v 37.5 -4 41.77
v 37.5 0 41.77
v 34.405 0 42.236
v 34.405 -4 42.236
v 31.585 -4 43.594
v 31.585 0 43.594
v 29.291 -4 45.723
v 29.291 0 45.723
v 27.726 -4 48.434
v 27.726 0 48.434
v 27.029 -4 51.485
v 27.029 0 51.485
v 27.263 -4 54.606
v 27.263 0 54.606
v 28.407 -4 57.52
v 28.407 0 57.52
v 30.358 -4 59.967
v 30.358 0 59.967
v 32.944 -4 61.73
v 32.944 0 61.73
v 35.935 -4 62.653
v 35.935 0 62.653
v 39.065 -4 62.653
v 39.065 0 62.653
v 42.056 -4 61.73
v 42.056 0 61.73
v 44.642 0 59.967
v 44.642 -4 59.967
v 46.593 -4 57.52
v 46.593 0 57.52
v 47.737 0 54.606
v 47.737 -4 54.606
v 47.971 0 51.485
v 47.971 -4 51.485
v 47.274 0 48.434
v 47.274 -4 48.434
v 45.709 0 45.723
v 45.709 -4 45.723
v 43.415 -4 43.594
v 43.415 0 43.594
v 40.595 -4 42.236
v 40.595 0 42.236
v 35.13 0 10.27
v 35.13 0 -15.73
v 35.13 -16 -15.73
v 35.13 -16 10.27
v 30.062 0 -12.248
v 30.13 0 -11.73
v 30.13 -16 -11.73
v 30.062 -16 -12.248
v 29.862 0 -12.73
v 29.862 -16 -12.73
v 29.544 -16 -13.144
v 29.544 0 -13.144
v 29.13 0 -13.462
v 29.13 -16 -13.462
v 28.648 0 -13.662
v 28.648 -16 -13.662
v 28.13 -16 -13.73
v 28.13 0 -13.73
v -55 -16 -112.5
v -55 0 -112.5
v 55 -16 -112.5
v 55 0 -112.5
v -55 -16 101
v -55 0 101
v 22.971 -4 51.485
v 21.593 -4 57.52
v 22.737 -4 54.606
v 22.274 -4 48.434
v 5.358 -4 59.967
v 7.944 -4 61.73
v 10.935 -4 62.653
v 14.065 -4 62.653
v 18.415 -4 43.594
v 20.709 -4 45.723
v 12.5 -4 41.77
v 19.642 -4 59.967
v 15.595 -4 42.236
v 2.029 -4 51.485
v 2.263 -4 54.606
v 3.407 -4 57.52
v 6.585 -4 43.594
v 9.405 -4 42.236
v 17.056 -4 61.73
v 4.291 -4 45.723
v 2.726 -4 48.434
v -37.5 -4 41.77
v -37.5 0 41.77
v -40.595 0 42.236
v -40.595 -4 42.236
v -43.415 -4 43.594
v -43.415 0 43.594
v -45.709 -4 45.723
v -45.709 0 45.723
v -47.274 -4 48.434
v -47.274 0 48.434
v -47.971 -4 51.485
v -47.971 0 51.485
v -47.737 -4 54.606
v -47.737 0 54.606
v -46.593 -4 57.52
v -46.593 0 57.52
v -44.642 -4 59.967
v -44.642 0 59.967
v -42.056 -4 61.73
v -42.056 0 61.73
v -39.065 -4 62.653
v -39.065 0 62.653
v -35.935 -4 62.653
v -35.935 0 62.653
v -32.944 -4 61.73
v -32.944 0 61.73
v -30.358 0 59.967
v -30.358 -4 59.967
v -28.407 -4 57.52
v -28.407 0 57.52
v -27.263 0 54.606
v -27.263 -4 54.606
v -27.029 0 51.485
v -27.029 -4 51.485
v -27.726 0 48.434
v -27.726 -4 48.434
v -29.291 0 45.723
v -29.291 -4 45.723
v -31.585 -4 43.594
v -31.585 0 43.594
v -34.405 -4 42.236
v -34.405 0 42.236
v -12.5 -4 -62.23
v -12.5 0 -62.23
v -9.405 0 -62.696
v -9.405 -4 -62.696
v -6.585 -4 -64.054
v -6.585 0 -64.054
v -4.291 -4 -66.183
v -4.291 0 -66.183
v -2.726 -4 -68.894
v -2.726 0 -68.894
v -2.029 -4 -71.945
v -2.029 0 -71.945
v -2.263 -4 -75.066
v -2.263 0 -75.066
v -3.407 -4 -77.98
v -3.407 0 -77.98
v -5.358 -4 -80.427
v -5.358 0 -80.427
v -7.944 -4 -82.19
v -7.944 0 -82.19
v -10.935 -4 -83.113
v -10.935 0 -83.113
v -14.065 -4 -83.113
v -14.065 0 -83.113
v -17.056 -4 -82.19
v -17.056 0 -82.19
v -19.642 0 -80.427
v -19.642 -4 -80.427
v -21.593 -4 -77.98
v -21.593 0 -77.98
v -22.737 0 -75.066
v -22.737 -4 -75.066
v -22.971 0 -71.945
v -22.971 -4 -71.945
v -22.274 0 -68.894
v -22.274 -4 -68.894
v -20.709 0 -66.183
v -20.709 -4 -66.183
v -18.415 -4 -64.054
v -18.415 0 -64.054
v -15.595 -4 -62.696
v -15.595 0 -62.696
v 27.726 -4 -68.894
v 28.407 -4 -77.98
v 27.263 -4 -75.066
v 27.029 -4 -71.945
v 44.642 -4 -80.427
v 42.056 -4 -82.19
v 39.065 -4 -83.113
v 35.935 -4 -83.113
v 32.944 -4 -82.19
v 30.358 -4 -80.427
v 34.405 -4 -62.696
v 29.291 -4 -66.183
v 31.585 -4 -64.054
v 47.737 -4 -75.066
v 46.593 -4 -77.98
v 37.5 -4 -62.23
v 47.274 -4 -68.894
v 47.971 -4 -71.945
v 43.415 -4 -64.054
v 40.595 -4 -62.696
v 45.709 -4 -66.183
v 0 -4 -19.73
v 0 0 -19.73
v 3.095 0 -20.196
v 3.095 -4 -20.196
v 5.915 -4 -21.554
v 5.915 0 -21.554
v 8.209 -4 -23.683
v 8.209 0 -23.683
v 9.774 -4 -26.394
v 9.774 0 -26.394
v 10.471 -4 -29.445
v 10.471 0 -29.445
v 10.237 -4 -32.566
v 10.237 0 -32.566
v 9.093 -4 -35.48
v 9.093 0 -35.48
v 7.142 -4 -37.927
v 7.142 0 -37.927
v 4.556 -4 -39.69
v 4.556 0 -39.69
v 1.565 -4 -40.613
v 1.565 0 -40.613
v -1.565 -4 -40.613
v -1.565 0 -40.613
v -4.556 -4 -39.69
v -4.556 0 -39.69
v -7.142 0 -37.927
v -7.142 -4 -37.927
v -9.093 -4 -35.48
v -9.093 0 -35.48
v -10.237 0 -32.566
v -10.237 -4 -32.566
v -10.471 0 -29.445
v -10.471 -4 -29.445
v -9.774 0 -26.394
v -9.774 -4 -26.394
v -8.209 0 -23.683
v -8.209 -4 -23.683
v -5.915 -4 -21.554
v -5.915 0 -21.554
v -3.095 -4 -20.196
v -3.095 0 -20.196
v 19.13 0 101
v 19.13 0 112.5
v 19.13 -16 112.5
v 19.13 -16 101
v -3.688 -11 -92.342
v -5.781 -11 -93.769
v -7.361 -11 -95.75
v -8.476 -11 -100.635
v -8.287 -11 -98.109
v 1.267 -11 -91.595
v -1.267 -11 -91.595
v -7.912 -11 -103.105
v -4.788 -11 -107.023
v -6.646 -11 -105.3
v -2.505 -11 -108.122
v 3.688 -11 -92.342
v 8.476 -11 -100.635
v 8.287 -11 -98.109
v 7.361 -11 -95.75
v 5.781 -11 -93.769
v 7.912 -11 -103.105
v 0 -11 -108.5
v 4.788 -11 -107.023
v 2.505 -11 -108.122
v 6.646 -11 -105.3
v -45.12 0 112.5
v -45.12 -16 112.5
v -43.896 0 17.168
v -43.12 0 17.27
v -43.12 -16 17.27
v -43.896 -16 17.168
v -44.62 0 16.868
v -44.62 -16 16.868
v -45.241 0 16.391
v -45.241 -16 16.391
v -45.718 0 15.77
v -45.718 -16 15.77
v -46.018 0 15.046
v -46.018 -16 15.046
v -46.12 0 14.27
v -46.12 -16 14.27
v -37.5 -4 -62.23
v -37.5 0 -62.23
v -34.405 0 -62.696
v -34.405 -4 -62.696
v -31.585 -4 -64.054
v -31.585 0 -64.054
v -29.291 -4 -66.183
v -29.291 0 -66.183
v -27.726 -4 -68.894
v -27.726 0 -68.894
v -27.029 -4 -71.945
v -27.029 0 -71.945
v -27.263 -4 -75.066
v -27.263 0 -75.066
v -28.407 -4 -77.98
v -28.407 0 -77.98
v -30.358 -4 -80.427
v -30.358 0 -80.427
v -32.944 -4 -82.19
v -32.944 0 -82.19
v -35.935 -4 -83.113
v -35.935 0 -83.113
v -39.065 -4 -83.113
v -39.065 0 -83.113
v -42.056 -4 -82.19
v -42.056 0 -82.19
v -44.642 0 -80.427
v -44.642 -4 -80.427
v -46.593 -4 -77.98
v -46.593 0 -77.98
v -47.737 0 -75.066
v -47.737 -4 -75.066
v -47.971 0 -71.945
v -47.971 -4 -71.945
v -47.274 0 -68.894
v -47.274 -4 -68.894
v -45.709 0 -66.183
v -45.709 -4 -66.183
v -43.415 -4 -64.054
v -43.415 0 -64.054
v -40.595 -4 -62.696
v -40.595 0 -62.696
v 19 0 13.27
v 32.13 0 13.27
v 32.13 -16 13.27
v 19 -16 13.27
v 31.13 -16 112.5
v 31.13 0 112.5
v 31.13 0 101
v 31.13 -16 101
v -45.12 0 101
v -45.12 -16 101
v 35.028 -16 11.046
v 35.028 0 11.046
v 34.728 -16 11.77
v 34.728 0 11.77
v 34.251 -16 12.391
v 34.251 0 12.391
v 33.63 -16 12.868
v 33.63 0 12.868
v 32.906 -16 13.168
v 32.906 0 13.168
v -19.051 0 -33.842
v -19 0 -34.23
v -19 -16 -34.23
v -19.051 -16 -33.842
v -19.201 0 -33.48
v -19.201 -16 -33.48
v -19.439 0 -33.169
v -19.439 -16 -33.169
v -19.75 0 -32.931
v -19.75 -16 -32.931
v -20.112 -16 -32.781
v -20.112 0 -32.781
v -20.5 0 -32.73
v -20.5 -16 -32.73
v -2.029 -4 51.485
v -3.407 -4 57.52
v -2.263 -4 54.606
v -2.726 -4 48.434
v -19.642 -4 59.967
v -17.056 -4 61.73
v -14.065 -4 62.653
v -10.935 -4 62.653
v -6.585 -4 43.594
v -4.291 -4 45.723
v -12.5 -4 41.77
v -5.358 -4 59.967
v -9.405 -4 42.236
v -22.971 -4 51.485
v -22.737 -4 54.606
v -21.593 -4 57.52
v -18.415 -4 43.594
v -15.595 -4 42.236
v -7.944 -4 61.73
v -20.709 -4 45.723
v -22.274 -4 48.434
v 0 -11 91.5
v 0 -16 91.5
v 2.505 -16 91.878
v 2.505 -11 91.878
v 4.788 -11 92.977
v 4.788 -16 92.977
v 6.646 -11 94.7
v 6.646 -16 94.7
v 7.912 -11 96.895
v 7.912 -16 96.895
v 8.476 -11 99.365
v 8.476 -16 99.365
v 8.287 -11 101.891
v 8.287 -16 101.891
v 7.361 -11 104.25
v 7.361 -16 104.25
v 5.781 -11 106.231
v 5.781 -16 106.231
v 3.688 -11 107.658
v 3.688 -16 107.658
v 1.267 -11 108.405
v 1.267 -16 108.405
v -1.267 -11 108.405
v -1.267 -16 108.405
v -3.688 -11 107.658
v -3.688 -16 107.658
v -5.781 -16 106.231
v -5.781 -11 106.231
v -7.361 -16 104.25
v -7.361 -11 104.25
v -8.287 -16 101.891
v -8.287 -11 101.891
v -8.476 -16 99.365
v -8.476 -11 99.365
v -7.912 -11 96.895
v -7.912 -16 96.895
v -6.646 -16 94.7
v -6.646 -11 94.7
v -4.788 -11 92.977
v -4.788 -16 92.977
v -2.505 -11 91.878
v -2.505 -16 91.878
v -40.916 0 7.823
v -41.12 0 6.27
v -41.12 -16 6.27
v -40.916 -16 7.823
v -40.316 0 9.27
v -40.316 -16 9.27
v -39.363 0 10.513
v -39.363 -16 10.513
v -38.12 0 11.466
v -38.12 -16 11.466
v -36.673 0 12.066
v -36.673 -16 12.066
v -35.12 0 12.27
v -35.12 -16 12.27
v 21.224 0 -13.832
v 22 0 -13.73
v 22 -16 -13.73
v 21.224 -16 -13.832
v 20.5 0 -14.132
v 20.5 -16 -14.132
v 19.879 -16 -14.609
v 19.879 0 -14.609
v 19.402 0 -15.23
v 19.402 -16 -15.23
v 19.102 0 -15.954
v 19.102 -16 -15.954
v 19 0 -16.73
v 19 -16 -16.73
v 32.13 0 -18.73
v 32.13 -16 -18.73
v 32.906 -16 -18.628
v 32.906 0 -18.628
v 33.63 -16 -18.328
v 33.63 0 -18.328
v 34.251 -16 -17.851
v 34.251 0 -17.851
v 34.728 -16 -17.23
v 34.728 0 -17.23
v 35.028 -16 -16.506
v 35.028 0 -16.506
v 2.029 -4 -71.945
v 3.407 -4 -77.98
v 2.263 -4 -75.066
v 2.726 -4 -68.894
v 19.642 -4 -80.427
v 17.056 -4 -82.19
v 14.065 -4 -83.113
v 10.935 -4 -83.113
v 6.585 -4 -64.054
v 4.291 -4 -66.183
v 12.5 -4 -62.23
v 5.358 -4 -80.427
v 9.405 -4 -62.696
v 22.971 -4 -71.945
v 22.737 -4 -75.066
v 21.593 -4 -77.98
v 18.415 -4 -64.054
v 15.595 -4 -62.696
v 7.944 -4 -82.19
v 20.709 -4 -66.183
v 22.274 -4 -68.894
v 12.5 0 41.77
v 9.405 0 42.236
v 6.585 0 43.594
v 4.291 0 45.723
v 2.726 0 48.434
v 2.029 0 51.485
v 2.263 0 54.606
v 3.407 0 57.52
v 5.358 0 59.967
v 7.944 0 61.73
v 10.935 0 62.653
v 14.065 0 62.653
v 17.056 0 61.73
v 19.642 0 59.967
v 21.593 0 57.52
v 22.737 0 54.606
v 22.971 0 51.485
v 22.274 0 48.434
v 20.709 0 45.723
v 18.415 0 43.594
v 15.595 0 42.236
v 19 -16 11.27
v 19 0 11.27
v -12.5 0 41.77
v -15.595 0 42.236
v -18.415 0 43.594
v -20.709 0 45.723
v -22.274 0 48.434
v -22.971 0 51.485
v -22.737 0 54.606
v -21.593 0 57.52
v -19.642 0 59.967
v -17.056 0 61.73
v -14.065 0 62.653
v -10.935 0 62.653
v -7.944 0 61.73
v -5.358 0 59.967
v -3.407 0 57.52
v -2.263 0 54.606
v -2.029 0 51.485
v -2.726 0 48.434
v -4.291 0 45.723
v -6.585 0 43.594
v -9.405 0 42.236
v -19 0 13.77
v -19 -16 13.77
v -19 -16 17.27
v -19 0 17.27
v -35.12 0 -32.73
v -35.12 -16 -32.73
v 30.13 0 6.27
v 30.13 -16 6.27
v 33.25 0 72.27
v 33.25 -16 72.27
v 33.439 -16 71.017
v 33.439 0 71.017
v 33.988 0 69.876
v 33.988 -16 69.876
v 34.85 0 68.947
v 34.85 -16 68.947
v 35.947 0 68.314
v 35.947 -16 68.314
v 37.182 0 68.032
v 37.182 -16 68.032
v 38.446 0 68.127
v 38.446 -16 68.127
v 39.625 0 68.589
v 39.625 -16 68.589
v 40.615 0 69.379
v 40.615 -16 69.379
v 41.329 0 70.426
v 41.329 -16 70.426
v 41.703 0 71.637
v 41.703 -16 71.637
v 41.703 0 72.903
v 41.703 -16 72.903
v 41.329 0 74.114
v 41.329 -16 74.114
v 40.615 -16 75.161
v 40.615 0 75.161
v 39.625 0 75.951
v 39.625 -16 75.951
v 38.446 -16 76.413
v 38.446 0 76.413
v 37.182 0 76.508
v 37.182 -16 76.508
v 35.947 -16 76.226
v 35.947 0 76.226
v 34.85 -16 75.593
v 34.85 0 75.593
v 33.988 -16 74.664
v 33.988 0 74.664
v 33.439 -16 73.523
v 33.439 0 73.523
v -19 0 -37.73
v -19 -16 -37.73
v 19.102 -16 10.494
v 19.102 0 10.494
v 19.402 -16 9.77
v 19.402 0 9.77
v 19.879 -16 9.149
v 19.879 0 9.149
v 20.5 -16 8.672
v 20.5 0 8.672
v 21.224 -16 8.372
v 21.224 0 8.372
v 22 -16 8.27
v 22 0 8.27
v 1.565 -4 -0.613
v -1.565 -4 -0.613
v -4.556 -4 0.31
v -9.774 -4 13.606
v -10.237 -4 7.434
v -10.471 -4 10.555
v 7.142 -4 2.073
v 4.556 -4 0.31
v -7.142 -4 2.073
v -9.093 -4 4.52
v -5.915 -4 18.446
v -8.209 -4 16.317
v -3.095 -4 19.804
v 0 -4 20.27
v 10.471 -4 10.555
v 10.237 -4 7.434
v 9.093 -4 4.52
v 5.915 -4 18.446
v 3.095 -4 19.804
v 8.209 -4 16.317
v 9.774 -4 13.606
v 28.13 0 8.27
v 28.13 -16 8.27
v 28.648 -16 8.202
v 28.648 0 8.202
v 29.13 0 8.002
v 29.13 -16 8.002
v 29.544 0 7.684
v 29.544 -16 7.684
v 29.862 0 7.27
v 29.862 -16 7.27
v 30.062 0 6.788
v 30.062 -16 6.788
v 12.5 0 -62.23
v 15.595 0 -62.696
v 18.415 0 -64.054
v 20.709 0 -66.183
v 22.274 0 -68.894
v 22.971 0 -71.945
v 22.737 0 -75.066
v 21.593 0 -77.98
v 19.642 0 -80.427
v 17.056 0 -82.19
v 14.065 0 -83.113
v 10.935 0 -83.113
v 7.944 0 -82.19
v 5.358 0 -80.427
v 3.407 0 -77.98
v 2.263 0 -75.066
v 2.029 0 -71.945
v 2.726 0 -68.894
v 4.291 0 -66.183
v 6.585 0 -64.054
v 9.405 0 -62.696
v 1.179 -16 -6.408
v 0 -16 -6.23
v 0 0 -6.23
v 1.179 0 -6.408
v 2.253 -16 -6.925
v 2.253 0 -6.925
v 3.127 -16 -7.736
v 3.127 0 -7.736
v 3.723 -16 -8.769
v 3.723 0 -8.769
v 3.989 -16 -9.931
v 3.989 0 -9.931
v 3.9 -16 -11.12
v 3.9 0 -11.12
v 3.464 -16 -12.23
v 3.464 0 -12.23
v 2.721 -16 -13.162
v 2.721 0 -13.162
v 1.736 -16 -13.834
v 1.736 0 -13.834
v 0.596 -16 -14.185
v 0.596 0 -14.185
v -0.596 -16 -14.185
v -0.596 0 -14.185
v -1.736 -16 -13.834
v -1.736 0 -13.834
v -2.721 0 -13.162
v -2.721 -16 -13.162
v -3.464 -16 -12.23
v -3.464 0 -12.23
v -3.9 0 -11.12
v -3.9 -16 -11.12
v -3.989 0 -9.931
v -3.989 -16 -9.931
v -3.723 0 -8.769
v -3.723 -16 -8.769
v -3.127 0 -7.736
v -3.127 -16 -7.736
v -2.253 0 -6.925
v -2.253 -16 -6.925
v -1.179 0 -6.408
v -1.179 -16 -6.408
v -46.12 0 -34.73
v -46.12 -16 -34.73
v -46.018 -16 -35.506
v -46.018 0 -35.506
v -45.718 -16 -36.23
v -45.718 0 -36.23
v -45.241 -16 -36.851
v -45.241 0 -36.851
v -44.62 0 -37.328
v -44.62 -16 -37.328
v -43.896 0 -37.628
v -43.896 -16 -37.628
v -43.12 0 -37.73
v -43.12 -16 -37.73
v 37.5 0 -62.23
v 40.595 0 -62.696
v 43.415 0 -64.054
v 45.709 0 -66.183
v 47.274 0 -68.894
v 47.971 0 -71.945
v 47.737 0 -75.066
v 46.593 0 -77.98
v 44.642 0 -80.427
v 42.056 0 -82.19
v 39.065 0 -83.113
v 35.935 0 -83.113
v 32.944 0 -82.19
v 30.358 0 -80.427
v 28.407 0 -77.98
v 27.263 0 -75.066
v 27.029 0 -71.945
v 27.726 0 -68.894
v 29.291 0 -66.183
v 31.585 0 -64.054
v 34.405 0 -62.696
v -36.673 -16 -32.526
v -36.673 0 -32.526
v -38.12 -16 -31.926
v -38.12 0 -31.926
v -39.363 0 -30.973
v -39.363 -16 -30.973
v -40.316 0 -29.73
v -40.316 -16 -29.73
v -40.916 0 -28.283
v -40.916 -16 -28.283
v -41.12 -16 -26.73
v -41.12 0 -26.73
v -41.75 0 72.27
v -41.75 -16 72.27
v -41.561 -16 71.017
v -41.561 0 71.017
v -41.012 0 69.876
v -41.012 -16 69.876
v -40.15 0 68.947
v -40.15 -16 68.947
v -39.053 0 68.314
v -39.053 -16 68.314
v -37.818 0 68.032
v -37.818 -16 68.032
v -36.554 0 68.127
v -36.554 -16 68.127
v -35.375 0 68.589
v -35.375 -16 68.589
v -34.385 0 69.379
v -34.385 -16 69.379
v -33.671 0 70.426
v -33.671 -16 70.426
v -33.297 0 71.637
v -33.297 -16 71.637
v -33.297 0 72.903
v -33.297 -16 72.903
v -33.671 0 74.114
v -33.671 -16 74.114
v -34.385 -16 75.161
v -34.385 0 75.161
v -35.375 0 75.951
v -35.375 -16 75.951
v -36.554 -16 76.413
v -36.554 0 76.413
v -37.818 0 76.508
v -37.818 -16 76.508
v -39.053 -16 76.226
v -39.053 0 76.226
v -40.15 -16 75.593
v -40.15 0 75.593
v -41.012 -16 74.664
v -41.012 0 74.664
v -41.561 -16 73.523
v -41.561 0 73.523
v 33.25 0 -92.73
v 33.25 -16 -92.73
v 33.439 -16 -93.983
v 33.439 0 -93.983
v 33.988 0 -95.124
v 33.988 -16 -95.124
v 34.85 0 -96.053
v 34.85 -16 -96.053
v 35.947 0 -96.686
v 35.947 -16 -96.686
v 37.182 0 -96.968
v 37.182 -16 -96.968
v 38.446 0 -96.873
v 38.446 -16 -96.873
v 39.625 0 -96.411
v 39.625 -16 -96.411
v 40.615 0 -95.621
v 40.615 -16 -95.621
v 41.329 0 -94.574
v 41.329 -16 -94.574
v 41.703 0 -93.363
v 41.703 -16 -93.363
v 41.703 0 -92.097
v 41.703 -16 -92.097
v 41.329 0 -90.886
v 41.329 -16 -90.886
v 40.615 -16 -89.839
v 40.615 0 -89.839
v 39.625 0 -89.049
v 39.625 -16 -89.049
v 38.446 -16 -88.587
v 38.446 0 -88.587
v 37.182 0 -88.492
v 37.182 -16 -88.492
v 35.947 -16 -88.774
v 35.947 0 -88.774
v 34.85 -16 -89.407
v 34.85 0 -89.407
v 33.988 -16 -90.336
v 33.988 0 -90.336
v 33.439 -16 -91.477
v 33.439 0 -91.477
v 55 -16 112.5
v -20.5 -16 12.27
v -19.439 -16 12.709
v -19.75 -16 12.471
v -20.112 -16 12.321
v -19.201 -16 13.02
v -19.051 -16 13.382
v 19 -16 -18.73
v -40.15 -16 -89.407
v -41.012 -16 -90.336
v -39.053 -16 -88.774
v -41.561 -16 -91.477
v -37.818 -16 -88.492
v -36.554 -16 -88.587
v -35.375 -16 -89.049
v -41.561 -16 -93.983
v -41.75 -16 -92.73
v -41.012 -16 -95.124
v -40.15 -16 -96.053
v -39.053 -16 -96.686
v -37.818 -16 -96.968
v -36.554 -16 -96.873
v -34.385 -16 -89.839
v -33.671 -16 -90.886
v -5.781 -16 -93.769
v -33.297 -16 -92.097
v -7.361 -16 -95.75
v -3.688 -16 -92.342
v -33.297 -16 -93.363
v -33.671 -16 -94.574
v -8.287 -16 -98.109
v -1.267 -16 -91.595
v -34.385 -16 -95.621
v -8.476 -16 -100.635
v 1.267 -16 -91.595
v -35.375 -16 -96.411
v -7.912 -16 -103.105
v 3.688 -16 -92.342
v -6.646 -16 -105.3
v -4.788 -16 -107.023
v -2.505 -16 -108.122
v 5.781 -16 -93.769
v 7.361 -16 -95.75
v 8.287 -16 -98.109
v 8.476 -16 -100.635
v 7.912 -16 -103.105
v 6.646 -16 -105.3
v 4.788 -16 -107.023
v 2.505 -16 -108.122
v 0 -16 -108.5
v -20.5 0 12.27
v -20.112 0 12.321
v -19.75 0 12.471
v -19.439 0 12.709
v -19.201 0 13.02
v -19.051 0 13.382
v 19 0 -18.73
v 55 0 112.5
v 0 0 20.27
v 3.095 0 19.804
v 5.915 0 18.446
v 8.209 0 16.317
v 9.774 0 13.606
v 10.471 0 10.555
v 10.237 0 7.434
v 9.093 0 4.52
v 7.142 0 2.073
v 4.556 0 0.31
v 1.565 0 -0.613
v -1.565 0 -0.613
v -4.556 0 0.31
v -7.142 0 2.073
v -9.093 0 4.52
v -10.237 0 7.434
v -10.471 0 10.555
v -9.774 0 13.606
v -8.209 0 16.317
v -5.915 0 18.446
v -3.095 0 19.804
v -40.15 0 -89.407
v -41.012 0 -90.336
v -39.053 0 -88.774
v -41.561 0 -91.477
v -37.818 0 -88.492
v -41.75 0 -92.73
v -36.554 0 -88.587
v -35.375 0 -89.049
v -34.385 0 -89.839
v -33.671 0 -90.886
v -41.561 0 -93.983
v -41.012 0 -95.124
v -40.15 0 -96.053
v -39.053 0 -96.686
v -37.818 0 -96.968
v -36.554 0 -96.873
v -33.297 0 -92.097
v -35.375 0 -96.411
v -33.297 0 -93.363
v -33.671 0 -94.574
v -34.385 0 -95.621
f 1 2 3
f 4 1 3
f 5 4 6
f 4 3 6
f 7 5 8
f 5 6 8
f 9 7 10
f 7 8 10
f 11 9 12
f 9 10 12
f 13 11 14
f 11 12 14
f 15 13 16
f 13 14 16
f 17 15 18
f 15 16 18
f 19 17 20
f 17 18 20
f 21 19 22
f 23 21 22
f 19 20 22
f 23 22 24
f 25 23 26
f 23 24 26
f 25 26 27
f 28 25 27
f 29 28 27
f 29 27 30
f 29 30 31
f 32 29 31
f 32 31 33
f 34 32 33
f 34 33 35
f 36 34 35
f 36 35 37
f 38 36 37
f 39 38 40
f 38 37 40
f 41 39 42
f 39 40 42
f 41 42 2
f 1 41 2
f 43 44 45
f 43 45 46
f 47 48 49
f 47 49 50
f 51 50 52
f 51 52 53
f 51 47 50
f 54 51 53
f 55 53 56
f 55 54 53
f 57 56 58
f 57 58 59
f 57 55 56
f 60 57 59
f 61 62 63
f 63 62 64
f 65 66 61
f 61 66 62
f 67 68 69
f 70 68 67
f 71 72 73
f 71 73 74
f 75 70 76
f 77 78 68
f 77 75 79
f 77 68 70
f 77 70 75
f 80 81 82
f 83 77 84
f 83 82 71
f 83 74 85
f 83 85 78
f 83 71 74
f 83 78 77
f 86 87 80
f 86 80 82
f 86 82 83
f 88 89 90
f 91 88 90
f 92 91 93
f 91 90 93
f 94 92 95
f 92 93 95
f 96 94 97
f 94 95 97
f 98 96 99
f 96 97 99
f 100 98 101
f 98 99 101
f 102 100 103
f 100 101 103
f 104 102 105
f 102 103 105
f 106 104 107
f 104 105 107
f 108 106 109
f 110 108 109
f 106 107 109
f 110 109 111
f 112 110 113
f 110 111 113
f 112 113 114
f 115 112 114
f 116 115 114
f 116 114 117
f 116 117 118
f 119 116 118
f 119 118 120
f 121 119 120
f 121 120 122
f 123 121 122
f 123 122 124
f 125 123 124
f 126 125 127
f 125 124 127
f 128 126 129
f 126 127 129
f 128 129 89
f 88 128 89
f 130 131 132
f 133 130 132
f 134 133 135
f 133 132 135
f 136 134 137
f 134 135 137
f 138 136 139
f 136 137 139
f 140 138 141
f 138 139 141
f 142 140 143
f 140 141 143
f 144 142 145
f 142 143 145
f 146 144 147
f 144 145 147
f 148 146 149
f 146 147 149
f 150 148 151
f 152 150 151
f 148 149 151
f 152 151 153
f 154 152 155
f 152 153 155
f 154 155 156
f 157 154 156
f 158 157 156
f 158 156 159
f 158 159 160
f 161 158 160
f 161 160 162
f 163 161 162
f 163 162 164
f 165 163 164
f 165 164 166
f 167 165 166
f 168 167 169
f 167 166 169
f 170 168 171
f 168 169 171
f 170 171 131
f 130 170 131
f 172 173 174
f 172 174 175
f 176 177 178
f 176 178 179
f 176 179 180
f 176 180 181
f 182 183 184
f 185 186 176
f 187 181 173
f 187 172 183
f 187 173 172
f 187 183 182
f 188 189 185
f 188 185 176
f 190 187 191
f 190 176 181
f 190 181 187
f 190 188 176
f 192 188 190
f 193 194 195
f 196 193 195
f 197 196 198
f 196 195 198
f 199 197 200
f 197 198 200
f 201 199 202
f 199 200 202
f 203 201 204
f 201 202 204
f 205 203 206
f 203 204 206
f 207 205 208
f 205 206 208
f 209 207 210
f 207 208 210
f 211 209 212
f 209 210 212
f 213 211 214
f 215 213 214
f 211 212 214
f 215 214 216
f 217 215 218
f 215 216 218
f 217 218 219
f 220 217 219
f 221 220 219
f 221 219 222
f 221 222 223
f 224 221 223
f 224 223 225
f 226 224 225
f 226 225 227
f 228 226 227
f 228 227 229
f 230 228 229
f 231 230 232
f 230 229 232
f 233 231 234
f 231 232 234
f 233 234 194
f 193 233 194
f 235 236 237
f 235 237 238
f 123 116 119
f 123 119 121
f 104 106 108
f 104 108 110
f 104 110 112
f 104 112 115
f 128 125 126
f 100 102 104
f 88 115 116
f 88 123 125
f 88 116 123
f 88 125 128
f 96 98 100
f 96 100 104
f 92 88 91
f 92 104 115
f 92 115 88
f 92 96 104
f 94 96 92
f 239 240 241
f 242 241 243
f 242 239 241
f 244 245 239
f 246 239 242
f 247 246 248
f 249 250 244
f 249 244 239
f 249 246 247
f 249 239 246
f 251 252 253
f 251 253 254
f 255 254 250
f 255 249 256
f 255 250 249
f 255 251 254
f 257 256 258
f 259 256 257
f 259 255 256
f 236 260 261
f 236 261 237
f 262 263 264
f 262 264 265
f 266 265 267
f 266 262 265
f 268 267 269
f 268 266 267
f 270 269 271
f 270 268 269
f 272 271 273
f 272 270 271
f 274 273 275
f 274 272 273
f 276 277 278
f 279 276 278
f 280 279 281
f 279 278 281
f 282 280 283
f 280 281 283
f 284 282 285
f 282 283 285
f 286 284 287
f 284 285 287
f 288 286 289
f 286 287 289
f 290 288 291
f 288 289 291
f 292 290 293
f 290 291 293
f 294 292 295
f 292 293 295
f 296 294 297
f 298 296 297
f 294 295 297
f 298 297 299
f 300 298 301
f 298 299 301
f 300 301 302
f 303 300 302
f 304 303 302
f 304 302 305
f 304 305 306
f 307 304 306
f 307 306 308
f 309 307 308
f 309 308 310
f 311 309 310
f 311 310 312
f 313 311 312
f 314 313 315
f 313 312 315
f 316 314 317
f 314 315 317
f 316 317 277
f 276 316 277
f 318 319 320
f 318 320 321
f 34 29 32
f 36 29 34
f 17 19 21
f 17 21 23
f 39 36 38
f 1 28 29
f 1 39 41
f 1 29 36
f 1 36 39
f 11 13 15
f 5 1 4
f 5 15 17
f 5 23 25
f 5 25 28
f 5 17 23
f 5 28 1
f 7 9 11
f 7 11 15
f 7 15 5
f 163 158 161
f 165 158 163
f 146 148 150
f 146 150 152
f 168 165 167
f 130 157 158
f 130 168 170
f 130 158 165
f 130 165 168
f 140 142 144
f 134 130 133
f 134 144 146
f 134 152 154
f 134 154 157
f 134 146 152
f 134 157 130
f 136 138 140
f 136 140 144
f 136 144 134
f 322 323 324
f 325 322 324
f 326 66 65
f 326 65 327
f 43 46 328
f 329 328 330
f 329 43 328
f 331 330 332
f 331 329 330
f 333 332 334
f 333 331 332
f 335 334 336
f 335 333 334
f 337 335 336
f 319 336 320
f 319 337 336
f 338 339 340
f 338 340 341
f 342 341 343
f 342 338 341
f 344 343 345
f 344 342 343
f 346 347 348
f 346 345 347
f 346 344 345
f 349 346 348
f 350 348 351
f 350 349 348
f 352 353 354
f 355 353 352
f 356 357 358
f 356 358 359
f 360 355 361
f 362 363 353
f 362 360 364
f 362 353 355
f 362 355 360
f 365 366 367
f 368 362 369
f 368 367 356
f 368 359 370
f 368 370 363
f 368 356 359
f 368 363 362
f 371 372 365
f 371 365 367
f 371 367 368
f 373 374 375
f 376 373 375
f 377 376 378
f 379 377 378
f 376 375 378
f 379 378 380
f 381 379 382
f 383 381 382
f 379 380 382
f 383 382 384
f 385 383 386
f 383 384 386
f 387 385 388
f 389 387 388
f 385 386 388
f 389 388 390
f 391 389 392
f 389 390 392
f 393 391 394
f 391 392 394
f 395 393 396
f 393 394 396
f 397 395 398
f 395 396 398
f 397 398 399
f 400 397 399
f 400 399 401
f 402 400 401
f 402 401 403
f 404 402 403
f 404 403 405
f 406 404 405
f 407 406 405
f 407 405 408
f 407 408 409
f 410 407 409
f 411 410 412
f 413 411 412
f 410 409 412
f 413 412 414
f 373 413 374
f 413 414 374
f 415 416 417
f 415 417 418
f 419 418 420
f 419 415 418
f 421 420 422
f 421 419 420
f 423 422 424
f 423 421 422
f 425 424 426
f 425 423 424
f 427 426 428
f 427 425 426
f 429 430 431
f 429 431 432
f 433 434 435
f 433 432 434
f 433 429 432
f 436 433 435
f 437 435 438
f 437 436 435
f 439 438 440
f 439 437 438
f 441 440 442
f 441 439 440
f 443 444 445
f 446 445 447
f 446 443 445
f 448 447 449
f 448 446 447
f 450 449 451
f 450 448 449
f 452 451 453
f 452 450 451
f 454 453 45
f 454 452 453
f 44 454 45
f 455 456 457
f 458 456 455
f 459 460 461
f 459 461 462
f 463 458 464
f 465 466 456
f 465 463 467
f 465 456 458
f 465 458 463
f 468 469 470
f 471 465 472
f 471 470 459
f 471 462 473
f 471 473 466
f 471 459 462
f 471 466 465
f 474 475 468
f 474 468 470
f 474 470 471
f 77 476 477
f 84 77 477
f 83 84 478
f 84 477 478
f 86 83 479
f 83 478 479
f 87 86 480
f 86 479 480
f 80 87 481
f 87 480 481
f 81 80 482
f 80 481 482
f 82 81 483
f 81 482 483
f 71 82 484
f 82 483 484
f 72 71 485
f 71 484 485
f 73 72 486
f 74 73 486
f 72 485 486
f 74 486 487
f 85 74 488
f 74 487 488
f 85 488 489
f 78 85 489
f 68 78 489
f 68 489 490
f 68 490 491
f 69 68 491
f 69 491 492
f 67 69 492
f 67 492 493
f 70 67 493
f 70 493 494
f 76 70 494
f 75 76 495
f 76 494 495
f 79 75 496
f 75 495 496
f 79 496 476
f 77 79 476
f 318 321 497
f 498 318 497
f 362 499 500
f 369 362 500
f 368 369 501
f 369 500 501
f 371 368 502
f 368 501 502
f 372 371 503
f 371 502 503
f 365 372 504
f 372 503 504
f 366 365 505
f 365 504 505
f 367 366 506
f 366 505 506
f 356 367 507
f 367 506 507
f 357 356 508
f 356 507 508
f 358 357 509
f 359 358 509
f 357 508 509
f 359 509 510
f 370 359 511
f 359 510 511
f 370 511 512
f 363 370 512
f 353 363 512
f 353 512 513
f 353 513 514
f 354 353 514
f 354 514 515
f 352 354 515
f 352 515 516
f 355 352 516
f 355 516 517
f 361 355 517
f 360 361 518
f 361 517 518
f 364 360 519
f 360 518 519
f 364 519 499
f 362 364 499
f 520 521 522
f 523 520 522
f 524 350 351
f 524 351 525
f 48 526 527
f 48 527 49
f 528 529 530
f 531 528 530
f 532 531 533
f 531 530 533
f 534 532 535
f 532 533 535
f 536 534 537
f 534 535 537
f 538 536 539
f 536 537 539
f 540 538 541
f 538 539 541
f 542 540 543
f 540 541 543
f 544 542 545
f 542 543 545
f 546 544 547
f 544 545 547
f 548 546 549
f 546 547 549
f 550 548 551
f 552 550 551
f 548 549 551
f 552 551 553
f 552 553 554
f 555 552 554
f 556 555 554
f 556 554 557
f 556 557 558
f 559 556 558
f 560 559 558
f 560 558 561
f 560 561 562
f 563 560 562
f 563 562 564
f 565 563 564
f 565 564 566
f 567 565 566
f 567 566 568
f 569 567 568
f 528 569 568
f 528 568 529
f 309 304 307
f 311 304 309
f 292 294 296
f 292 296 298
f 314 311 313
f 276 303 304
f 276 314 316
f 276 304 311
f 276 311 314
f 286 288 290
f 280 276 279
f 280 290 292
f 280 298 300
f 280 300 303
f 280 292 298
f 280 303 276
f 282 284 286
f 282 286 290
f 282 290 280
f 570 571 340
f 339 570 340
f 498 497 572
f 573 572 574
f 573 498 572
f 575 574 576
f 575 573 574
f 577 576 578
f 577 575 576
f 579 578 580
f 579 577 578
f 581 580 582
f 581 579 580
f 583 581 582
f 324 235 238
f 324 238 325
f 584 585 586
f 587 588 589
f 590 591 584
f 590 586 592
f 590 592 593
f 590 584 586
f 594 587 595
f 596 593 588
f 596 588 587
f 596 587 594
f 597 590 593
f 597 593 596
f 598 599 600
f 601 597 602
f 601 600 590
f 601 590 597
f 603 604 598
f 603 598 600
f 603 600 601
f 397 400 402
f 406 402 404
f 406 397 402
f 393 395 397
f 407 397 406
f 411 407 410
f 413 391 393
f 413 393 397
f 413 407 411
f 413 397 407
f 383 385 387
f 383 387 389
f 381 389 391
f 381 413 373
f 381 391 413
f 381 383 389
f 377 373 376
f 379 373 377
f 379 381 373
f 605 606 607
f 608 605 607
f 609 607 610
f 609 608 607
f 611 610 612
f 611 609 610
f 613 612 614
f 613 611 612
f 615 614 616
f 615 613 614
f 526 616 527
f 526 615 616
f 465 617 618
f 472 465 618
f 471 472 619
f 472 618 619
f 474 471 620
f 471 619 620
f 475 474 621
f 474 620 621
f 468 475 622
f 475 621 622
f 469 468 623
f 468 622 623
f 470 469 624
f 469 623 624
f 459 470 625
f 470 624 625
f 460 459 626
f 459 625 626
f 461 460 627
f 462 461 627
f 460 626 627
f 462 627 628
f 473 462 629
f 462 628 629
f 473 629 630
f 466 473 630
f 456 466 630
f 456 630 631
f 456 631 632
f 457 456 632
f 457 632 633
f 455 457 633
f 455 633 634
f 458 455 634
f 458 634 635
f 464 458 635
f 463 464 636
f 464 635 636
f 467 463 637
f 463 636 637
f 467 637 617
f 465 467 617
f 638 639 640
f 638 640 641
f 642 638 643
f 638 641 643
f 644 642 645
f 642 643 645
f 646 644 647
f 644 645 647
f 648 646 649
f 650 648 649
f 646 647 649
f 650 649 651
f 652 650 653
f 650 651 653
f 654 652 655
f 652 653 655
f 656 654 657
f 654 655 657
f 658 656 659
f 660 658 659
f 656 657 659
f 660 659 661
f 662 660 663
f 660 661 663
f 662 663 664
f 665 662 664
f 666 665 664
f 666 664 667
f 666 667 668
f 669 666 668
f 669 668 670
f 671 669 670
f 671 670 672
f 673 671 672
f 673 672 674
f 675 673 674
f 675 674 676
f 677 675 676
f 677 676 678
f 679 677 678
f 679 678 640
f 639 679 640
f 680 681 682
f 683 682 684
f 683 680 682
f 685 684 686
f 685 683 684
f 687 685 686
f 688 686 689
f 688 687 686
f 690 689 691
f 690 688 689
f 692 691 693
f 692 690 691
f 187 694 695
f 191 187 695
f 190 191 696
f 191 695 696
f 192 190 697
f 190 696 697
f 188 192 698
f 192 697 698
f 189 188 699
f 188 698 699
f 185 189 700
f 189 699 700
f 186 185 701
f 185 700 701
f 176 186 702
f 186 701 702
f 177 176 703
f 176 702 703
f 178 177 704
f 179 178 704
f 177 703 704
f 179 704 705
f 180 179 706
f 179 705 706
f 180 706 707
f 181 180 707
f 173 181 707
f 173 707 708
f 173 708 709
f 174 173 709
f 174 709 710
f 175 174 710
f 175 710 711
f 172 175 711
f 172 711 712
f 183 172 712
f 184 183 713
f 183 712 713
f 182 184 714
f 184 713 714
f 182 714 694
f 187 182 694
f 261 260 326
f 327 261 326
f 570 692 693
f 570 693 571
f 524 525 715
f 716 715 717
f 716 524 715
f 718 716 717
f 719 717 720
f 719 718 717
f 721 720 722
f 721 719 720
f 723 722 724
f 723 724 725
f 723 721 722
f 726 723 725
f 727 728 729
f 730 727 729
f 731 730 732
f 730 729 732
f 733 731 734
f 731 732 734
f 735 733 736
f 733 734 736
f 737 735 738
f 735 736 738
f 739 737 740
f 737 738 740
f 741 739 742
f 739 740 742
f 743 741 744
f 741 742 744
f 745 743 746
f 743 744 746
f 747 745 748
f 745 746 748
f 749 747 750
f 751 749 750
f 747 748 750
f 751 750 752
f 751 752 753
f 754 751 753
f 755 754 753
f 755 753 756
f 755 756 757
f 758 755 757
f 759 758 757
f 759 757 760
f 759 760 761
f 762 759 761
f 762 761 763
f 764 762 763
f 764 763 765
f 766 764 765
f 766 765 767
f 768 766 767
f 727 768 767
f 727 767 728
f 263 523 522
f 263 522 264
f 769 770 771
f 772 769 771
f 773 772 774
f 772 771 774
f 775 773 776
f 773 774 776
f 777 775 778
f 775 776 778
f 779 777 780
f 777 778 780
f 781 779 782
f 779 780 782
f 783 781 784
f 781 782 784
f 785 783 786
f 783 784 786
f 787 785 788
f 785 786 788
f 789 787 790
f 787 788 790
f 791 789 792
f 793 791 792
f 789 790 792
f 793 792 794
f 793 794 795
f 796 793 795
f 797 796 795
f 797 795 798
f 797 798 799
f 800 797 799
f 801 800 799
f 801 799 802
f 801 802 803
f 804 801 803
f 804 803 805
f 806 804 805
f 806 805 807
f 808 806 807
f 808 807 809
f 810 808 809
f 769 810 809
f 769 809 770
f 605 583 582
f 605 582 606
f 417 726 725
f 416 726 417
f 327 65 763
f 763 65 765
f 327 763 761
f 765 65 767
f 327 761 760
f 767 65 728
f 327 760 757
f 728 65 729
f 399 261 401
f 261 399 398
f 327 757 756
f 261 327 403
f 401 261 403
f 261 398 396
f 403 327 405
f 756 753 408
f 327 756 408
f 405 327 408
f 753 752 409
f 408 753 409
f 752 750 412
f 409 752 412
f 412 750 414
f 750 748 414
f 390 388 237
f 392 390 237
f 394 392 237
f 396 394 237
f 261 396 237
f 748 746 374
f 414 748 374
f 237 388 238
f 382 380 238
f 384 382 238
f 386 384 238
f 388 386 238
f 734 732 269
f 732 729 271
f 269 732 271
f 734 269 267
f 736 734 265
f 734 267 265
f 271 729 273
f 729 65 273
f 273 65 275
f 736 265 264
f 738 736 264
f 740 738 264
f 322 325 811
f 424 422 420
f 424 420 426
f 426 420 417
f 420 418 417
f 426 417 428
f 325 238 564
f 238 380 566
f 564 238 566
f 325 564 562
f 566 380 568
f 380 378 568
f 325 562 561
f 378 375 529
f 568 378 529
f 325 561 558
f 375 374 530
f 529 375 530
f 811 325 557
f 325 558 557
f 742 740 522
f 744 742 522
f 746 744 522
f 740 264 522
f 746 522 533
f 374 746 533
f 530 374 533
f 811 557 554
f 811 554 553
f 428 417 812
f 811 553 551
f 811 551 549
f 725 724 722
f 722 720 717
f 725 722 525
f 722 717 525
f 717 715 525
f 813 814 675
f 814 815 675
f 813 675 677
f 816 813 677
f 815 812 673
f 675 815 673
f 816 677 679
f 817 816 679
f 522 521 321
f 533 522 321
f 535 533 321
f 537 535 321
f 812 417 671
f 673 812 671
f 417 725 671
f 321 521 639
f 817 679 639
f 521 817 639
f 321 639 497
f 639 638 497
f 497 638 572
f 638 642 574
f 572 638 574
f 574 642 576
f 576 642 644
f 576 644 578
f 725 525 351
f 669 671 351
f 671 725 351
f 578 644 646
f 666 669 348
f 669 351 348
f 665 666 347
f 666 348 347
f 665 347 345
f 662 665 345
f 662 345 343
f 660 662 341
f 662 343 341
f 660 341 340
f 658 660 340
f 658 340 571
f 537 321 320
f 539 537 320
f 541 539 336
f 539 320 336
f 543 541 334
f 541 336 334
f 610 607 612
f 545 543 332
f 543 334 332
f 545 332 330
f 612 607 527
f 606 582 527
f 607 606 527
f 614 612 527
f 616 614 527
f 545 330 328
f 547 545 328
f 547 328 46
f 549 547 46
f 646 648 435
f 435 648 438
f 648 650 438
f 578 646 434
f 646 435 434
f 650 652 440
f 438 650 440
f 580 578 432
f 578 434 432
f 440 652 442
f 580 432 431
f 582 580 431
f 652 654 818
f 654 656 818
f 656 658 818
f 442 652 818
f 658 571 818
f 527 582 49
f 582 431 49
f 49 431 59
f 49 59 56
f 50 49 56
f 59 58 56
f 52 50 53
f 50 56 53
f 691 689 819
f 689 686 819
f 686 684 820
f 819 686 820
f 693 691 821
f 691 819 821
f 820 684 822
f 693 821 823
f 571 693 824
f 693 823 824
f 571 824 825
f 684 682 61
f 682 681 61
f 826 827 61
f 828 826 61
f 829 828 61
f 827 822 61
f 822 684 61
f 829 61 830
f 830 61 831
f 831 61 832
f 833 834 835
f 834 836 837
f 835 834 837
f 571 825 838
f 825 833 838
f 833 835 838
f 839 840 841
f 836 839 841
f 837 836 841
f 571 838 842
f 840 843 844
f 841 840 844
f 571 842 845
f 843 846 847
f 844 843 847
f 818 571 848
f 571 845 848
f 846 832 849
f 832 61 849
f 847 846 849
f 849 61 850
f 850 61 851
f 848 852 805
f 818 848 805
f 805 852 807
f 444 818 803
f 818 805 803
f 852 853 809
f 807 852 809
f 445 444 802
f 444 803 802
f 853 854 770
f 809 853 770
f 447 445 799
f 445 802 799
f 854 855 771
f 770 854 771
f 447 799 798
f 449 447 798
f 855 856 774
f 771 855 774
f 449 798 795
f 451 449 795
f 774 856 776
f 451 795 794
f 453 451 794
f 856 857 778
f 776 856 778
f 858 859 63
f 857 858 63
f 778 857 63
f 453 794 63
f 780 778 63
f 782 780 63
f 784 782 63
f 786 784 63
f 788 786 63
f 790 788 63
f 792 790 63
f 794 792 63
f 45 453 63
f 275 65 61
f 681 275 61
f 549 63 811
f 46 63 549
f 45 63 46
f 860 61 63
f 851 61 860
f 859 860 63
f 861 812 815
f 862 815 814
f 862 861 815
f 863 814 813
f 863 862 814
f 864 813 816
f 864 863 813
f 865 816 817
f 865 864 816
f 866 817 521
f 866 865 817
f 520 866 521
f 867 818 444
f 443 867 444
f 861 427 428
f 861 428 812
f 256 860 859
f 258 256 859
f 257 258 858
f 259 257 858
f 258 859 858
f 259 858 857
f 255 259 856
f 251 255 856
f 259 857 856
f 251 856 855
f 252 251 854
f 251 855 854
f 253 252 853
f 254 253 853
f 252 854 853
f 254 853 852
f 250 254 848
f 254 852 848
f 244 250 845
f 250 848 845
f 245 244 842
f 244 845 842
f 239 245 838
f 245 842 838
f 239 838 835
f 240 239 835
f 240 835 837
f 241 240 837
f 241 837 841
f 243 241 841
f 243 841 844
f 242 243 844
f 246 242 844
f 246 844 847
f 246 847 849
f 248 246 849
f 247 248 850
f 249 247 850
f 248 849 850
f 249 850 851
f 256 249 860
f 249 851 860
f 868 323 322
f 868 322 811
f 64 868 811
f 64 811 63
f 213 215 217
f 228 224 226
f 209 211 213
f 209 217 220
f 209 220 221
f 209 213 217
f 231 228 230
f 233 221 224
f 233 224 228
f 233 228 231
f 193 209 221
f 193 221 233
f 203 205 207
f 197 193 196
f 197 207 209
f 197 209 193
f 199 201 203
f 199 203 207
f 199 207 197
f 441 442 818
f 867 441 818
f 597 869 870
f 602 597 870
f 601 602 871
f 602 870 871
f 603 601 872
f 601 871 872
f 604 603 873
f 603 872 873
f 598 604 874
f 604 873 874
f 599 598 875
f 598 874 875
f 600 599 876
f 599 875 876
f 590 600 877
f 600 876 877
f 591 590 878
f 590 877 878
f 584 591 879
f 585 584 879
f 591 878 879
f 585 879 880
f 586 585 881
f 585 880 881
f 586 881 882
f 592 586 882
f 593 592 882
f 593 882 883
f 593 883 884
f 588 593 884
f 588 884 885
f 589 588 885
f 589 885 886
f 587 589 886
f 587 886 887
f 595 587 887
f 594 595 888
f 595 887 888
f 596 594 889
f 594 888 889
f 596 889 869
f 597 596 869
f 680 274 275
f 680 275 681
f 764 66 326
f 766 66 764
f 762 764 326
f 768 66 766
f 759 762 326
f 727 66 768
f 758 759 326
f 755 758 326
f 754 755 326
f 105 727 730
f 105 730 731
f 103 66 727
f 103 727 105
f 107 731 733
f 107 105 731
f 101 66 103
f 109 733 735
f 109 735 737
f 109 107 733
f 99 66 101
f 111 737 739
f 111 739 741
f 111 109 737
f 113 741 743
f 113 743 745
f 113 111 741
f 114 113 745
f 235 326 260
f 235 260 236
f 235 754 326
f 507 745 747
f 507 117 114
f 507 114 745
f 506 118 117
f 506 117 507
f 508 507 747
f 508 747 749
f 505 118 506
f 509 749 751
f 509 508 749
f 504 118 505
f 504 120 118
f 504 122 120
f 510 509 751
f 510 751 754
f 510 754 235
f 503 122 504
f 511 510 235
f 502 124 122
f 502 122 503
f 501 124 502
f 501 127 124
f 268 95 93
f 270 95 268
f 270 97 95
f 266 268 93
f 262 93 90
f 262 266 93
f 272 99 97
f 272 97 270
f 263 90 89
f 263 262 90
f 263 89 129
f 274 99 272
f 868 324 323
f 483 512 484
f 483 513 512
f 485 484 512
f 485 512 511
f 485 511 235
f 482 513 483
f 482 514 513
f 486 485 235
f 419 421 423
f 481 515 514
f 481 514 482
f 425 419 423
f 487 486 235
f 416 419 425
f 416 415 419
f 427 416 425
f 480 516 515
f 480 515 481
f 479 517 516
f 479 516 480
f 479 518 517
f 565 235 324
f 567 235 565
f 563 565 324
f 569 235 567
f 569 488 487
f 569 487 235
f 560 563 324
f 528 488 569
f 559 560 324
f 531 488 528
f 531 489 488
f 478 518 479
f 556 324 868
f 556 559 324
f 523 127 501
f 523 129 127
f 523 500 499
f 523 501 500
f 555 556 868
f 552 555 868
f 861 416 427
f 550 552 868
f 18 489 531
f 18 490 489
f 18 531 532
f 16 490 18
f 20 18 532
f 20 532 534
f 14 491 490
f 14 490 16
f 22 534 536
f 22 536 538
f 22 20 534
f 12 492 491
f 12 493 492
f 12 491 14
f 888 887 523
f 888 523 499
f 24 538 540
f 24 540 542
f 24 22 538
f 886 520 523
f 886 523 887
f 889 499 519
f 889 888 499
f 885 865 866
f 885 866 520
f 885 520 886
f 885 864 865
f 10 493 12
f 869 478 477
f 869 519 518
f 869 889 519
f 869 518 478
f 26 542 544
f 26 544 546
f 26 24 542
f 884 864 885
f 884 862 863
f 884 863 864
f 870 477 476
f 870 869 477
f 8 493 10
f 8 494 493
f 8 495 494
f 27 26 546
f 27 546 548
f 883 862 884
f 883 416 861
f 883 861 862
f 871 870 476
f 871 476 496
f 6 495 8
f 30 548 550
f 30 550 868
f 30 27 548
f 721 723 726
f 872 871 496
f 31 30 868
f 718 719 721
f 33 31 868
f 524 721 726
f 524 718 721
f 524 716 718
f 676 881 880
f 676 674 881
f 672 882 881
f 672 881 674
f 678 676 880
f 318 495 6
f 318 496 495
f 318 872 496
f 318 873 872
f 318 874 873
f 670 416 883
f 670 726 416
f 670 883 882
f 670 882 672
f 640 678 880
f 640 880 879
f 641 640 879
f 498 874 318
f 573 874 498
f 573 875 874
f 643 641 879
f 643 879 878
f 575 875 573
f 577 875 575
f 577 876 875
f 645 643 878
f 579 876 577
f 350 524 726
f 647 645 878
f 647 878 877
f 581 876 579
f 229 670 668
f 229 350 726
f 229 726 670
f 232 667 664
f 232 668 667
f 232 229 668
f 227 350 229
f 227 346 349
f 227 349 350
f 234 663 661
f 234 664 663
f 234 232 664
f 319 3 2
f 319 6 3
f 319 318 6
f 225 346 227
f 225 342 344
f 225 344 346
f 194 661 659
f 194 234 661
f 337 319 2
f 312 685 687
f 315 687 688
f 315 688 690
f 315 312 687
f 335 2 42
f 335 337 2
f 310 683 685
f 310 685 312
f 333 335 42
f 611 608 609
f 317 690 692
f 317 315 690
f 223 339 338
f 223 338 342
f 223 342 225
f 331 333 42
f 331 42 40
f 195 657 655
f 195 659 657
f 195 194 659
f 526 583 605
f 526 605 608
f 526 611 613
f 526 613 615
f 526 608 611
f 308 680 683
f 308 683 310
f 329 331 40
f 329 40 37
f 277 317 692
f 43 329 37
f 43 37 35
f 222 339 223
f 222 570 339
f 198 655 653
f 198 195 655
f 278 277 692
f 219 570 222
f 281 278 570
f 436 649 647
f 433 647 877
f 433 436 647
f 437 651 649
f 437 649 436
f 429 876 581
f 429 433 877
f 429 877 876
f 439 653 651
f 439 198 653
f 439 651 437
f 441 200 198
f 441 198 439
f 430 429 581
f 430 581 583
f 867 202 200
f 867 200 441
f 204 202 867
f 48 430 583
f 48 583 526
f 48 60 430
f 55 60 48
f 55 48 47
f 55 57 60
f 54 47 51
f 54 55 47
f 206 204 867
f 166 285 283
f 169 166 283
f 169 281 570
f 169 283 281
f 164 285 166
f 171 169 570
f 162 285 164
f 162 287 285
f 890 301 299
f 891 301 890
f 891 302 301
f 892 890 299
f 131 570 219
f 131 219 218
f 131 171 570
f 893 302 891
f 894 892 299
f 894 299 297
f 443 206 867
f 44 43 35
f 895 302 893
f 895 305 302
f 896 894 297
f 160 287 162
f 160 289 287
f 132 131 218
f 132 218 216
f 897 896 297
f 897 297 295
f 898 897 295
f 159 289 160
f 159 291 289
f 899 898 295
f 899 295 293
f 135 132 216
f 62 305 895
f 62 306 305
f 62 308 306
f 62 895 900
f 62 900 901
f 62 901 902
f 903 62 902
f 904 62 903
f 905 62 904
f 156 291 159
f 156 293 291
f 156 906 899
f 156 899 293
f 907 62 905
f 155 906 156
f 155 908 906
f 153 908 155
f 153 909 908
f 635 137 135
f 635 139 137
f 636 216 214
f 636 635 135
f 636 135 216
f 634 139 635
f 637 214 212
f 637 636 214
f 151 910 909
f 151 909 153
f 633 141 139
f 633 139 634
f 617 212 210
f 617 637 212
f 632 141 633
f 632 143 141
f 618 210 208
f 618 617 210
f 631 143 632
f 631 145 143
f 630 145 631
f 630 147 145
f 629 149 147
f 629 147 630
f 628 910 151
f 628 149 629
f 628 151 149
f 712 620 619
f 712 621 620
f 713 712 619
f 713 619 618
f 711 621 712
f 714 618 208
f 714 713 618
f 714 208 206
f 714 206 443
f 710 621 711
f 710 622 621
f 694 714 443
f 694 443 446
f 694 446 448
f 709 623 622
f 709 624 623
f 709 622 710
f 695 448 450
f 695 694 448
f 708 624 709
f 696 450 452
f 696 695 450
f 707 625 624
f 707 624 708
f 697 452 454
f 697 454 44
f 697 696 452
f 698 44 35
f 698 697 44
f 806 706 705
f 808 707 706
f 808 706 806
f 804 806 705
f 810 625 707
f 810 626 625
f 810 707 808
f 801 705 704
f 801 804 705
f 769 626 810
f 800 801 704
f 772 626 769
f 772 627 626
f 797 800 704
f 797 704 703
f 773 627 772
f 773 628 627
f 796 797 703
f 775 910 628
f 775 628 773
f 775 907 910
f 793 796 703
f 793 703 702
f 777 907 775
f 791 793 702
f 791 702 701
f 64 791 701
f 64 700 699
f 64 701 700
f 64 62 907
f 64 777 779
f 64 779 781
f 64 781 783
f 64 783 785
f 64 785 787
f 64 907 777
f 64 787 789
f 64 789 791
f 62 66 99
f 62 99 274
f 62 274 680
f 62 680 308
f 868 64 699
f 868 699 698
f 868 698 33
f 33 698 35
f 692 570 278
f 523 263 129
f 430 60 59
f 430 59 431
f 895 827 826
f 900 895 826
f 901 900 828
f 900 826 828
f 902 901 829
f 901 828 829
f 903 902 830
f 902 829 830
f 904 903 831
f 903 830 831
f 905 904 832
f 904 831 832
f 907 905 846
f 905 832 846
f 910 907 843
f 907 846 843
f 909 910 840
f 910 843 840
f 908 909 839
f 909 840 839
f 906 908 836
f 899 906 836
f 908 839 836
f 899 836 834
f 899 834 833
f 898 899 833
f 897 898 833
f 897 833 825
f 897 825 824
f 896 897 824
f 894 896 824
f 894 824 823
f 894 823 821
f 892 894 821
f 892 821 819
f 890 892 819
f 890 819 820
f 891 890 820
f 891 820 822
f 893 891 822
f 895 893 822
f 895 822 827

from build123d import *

# Parameters (mm, degrees)
SKETCH1_W           = 110
SKETCH1_H           = 225
BOSS_EXTRUDE1_DEPTH = 16
CUT_EXTRUDE1_REACH  = 128.243
CUT_EXTRUDE2_REACH  = 128.243
SKETCH4_R           = 8.5
CUT_EXTRUDE3_DEPTH  = 5
SKETCH5_R           = 10.5
CUT_EXTRUDE4_DEPTH  = 4
CUT_EXTRUDE5_REACH  = 128.243
SKETCH6_W           = 12
SKETCH6_H           = 11.5
M10_TAPPED_HOLE1_D  = 8.5
CUT_EXTRUDE6_REACH  = 128.243
SKETCH10_R          = 4


with BuildPart() as part:
    # Sketch1 → Boss-Extrude1 (new body)
    with BuildSketch(Plane(origin=(0, 0, 0), x_dir=(1, 0, 0), z_dir=(0, 1, 0))):
        Rectangle(SKETCH1_W, SKETCH1_H)
    extrude(amount=-BOSS_EXTRUDE1_DEPTH)

    # Sketch2 → Cut-Extrude1 (cut, up to next)
    with BuildSketch(Plane(origin=(0, 0, 0), x_dir=(1, 0, 0), z_dir=(0, 1, 0)), mode=Mode.PRIVATE) as cut_extrude1_sk1:
        with BuildLine():
            Line((-19, 37.73), (-19, 34.23))
            ThreePointArc((-19, 34.23), (-19.439339828, 33.169339828), (-20.5, 32.73))
            Line((-20.5, 32.73), (-35.12, 32.73))
            ThreePointArc((-35.12, 32.73), (-39.362640687, 30.972640687), (-41.12, 26.73))
            Line((-41.12, 26.73), (-41.12, -6.27))
            ThreePointArc((-41.12, -6.27), (-39.362640687, -10.512640687), (-35.12, -12.27))
            Line((-35.12, -12.27), (-20.5, -12.27))
            ThreePointArc((-20.5, -12.27), (-19.439339828, -12.709339828), (-19, -13.77))
            Line((-19, -13.77), (-19, -17.27))
            Line((-19, -17.27), (-43.12, -17.27))
            ThreePointArc((-43.12, -17.27), (-45.241320344, -16.391320344), (-46.12, -14.27))
            Line((-46.12, -14.27), (-46.12, 34.73))
            ThreePointArc((-46.12, 34.73), (-45.241320344, 36.851320344), (-43.12, 37.73))
            Line((-43.12, 37.73), (-19, 37.73))
        make_face()
    cut_extrude1_tool1 = extrude(cut_extrude1_sk1.sketch, amount=-CUT_EXTRUDE1_REACH, mode=Mode.PRIVATE) & part.part
    add(cut_extrude1_tool1.solids().sort_by_distance((-44.807702, 0, 15.957702))[0], mode=Mode.SUBTRACT)

    # Sketch3 → Cut-Extrude2 (cut, up to next)
    with BuildSketch(Plane(origin=(0, 0, 0), x_dir=(1, 0, 0), z_dir=(0, 1, 0)), mode=Mode.PRIVATE) as cut_extrude2_sk1:
        with BuildLine():
            Line((19, 18.73), (32.13, 18.73))
            ThreePointArc((32.13, 18.73), (34.251320344, 17.851320344), (35.13, 15.73))
            Line((35.13, 15.73), (35.13, -10.27))
            ThreePointArc((35.13, -10.27), (34.251320344, -12.391320344), (32.13, -13.27))
            Line((32.13, -13.27), (19, -13.27))
            Line((19, -13.27), (19, -11.27))
            ThreePointArc((19, -11.27), (19.878679656, -9.148679656), (22, -8.27))
            Line((22, -8.27), (28.13, -8.27))
            ThreePointArc((28.13, -8.27), (29.544213562, -7.684213562), (30.13, -6.27))
            Line((30.13, -6.27), (30.13, 11.73))
            ThreePointArc((30.13, 11.73), (29.544213562, 13.144213562), (28.13, 13.73))
            Line((28.13, 13.73), (22, 13.73))
            ThreePointArc((22, 13.73), (19.878679656, 14.608679656), (19, 16.73))
            Line((19, 16.73), (19, 18.73))
        make_face()
    cut_extrude2_tool1 = extrude(cut_extrude2_sk1.sketch, amount=-CUT_EXTRUDE2_REACH, mode=Mode.PRIVATE) & part.part
    add(cut_extrude2_tool1.solids().sort_by_distance((29.797608, 0, -13.397608))[0], mode=Mode.SUBTRACT)

    # Sketch4 → Cut-Extrude3 (cut)
    with BuildSketch(Plane.XZ.offset(16)):
        with Locations(Location((0, 100, 0), (0, 0, 270))):
            Circle(SKETCH4_R)
        with Locations(Location((0, -100, 0), (0, 0, 270))):
            Circle(SKETCH4_R)
    extrude(amount=-CUT_EXTRUDE3_DEPTH, mode=Mode.SUBTRACT)

    # Sketch5 → Cut-Extrude4 (cut)
    with BuildSketch(Plane(origin=(0, 0, 0), x_dir=(1, 0, 0), z_dir=(0, 1, 0))):
        with Locations(Location((-37.5, 72.73, 0), (0, 0, 270))):
            Circle(SKETCH5_R)
        with Locations(Location((-12.5, 72.73, 0), (0, 0, 270))):
            Circle(SKETCH5_R)
        with Locations(Location((12.5, 72.73, 0), (0, 0, 270))):
            Circle(SKETCH5_R)
        with Locations(Location((37.5, 72.73, 0), (0, 0, 270))):
            Circle(SKETCH5_R)
        with Locations(Location((37.5, -52.27, 0), (0, 0, 90))):
            Circle(SKETCH5_R)
        with Locations(Location((12.5, -52.27, 0), (0, 0, 90))):
            Circle(SKETCH5_R)
        with Locations(Location((-12.5, -52.27, 0), (0, 0, 90))):
            Circle(SKETCH5_R)
        with Locations(Location((-37.5, -52.27, 0), (0, 0, 90))):
            Circle(SKETCH5_R)
        with Locations(Location((0, 30.23, 0), (0, 0, 270))):
            Circle(SKETCH5_R)
        with Locations(Location((0, -9.77, 0), (0, 0, 270))):
            Circle(SKETCH5_R)
    extrude(amount=-CUT_EXTRUDE4_DEPTH, mode=Mode.SUBTRACT)

    # Sketch6 → Cut-Extrude5 (cut, up to next)
    with BuildSketch(Plane(origin=(0, 0, 0), x_dir=(1, 0, 0), z_dir=(0, 1, 0)), mode=Mode.PRIVATE) as cut_extrude5_sk1:
        with Locations((25.13, -106.75)):
            Rectangle(SKETCH6_W, SKETCH6_H)
    cut_extrude5_tool1 = extrude(cut_extrude5_sk1.sketch, amount=-CUT_EXTRUDE5_REACH, mode=Mode.PRIVATE) & part.part
    # Sketch6 → Cut-Extrude5 (cut, up to next)
    with BuildSketch(Plane(origin=(0, 0, 0), x_dir=(1, 0, 0), z_dir=(0, 1, 0)), mode=Mode.PRIVATE) as cut_extrude5_sk2:
        with Locations((-51.12, -106.75)):
            Rectangle(SKETCH6_W, SKETCH6_H)
    cut_extrude5_tool2 = extrude(cut_extrude5_sk2.sketch, amount=-CUT_EXTRUDE5_REACH, mode=Mode.PRIVATE) & part.part
    add(cut_extrude5_tool1.solids().sort_by_distance((25.13, 0, 106.75))[0], mode=Mode.SUBTRACT)
    add(cut_extrude5_tool2.solids().sort_by_distance((-51.12, 0, 106.75))[0], mode=Mode.SUBTRACT)

    # M10 Tapped Hole1 (through all)
    with Locations(Plane(origin=(0, 0, 0), x_dir=(1, 0, 0), z_dir=(0, 1, 0))):
        with Locations((-37.5, -72.27), (37.5, -72.27), (37.5, 92.73), (-37.5, 92.73)):
            Hole(M10_TAPPED_HOLE1_D / 2)

    # Sketch10 → Cut-Extrude6 (cut, up to next)
    with BuildSketch(Plane(origin=(0, 0, 0), x_dir=(1, 0, 0), z_dir=(0, 1, 0)), mode=Mode.PRIVATE) as cut_extrude6_sk1:
        with Locations(Location((0, 10.23, 0), (0, 0, 270))):
            Circle(SKETCH10_R)
    cut_extrude6_tool1 = extrude(cut_extrude6_sk1.sketch, amount=-CUT_EXTRUDE6_REACH, mode=Mode.PRIVATE) & part.part
    add(cut_extrude6_tool1.solids().sort_by_distance((0, 0, -10.23))[0], mode=Mode.SUBTRACT)


solid = part.part
